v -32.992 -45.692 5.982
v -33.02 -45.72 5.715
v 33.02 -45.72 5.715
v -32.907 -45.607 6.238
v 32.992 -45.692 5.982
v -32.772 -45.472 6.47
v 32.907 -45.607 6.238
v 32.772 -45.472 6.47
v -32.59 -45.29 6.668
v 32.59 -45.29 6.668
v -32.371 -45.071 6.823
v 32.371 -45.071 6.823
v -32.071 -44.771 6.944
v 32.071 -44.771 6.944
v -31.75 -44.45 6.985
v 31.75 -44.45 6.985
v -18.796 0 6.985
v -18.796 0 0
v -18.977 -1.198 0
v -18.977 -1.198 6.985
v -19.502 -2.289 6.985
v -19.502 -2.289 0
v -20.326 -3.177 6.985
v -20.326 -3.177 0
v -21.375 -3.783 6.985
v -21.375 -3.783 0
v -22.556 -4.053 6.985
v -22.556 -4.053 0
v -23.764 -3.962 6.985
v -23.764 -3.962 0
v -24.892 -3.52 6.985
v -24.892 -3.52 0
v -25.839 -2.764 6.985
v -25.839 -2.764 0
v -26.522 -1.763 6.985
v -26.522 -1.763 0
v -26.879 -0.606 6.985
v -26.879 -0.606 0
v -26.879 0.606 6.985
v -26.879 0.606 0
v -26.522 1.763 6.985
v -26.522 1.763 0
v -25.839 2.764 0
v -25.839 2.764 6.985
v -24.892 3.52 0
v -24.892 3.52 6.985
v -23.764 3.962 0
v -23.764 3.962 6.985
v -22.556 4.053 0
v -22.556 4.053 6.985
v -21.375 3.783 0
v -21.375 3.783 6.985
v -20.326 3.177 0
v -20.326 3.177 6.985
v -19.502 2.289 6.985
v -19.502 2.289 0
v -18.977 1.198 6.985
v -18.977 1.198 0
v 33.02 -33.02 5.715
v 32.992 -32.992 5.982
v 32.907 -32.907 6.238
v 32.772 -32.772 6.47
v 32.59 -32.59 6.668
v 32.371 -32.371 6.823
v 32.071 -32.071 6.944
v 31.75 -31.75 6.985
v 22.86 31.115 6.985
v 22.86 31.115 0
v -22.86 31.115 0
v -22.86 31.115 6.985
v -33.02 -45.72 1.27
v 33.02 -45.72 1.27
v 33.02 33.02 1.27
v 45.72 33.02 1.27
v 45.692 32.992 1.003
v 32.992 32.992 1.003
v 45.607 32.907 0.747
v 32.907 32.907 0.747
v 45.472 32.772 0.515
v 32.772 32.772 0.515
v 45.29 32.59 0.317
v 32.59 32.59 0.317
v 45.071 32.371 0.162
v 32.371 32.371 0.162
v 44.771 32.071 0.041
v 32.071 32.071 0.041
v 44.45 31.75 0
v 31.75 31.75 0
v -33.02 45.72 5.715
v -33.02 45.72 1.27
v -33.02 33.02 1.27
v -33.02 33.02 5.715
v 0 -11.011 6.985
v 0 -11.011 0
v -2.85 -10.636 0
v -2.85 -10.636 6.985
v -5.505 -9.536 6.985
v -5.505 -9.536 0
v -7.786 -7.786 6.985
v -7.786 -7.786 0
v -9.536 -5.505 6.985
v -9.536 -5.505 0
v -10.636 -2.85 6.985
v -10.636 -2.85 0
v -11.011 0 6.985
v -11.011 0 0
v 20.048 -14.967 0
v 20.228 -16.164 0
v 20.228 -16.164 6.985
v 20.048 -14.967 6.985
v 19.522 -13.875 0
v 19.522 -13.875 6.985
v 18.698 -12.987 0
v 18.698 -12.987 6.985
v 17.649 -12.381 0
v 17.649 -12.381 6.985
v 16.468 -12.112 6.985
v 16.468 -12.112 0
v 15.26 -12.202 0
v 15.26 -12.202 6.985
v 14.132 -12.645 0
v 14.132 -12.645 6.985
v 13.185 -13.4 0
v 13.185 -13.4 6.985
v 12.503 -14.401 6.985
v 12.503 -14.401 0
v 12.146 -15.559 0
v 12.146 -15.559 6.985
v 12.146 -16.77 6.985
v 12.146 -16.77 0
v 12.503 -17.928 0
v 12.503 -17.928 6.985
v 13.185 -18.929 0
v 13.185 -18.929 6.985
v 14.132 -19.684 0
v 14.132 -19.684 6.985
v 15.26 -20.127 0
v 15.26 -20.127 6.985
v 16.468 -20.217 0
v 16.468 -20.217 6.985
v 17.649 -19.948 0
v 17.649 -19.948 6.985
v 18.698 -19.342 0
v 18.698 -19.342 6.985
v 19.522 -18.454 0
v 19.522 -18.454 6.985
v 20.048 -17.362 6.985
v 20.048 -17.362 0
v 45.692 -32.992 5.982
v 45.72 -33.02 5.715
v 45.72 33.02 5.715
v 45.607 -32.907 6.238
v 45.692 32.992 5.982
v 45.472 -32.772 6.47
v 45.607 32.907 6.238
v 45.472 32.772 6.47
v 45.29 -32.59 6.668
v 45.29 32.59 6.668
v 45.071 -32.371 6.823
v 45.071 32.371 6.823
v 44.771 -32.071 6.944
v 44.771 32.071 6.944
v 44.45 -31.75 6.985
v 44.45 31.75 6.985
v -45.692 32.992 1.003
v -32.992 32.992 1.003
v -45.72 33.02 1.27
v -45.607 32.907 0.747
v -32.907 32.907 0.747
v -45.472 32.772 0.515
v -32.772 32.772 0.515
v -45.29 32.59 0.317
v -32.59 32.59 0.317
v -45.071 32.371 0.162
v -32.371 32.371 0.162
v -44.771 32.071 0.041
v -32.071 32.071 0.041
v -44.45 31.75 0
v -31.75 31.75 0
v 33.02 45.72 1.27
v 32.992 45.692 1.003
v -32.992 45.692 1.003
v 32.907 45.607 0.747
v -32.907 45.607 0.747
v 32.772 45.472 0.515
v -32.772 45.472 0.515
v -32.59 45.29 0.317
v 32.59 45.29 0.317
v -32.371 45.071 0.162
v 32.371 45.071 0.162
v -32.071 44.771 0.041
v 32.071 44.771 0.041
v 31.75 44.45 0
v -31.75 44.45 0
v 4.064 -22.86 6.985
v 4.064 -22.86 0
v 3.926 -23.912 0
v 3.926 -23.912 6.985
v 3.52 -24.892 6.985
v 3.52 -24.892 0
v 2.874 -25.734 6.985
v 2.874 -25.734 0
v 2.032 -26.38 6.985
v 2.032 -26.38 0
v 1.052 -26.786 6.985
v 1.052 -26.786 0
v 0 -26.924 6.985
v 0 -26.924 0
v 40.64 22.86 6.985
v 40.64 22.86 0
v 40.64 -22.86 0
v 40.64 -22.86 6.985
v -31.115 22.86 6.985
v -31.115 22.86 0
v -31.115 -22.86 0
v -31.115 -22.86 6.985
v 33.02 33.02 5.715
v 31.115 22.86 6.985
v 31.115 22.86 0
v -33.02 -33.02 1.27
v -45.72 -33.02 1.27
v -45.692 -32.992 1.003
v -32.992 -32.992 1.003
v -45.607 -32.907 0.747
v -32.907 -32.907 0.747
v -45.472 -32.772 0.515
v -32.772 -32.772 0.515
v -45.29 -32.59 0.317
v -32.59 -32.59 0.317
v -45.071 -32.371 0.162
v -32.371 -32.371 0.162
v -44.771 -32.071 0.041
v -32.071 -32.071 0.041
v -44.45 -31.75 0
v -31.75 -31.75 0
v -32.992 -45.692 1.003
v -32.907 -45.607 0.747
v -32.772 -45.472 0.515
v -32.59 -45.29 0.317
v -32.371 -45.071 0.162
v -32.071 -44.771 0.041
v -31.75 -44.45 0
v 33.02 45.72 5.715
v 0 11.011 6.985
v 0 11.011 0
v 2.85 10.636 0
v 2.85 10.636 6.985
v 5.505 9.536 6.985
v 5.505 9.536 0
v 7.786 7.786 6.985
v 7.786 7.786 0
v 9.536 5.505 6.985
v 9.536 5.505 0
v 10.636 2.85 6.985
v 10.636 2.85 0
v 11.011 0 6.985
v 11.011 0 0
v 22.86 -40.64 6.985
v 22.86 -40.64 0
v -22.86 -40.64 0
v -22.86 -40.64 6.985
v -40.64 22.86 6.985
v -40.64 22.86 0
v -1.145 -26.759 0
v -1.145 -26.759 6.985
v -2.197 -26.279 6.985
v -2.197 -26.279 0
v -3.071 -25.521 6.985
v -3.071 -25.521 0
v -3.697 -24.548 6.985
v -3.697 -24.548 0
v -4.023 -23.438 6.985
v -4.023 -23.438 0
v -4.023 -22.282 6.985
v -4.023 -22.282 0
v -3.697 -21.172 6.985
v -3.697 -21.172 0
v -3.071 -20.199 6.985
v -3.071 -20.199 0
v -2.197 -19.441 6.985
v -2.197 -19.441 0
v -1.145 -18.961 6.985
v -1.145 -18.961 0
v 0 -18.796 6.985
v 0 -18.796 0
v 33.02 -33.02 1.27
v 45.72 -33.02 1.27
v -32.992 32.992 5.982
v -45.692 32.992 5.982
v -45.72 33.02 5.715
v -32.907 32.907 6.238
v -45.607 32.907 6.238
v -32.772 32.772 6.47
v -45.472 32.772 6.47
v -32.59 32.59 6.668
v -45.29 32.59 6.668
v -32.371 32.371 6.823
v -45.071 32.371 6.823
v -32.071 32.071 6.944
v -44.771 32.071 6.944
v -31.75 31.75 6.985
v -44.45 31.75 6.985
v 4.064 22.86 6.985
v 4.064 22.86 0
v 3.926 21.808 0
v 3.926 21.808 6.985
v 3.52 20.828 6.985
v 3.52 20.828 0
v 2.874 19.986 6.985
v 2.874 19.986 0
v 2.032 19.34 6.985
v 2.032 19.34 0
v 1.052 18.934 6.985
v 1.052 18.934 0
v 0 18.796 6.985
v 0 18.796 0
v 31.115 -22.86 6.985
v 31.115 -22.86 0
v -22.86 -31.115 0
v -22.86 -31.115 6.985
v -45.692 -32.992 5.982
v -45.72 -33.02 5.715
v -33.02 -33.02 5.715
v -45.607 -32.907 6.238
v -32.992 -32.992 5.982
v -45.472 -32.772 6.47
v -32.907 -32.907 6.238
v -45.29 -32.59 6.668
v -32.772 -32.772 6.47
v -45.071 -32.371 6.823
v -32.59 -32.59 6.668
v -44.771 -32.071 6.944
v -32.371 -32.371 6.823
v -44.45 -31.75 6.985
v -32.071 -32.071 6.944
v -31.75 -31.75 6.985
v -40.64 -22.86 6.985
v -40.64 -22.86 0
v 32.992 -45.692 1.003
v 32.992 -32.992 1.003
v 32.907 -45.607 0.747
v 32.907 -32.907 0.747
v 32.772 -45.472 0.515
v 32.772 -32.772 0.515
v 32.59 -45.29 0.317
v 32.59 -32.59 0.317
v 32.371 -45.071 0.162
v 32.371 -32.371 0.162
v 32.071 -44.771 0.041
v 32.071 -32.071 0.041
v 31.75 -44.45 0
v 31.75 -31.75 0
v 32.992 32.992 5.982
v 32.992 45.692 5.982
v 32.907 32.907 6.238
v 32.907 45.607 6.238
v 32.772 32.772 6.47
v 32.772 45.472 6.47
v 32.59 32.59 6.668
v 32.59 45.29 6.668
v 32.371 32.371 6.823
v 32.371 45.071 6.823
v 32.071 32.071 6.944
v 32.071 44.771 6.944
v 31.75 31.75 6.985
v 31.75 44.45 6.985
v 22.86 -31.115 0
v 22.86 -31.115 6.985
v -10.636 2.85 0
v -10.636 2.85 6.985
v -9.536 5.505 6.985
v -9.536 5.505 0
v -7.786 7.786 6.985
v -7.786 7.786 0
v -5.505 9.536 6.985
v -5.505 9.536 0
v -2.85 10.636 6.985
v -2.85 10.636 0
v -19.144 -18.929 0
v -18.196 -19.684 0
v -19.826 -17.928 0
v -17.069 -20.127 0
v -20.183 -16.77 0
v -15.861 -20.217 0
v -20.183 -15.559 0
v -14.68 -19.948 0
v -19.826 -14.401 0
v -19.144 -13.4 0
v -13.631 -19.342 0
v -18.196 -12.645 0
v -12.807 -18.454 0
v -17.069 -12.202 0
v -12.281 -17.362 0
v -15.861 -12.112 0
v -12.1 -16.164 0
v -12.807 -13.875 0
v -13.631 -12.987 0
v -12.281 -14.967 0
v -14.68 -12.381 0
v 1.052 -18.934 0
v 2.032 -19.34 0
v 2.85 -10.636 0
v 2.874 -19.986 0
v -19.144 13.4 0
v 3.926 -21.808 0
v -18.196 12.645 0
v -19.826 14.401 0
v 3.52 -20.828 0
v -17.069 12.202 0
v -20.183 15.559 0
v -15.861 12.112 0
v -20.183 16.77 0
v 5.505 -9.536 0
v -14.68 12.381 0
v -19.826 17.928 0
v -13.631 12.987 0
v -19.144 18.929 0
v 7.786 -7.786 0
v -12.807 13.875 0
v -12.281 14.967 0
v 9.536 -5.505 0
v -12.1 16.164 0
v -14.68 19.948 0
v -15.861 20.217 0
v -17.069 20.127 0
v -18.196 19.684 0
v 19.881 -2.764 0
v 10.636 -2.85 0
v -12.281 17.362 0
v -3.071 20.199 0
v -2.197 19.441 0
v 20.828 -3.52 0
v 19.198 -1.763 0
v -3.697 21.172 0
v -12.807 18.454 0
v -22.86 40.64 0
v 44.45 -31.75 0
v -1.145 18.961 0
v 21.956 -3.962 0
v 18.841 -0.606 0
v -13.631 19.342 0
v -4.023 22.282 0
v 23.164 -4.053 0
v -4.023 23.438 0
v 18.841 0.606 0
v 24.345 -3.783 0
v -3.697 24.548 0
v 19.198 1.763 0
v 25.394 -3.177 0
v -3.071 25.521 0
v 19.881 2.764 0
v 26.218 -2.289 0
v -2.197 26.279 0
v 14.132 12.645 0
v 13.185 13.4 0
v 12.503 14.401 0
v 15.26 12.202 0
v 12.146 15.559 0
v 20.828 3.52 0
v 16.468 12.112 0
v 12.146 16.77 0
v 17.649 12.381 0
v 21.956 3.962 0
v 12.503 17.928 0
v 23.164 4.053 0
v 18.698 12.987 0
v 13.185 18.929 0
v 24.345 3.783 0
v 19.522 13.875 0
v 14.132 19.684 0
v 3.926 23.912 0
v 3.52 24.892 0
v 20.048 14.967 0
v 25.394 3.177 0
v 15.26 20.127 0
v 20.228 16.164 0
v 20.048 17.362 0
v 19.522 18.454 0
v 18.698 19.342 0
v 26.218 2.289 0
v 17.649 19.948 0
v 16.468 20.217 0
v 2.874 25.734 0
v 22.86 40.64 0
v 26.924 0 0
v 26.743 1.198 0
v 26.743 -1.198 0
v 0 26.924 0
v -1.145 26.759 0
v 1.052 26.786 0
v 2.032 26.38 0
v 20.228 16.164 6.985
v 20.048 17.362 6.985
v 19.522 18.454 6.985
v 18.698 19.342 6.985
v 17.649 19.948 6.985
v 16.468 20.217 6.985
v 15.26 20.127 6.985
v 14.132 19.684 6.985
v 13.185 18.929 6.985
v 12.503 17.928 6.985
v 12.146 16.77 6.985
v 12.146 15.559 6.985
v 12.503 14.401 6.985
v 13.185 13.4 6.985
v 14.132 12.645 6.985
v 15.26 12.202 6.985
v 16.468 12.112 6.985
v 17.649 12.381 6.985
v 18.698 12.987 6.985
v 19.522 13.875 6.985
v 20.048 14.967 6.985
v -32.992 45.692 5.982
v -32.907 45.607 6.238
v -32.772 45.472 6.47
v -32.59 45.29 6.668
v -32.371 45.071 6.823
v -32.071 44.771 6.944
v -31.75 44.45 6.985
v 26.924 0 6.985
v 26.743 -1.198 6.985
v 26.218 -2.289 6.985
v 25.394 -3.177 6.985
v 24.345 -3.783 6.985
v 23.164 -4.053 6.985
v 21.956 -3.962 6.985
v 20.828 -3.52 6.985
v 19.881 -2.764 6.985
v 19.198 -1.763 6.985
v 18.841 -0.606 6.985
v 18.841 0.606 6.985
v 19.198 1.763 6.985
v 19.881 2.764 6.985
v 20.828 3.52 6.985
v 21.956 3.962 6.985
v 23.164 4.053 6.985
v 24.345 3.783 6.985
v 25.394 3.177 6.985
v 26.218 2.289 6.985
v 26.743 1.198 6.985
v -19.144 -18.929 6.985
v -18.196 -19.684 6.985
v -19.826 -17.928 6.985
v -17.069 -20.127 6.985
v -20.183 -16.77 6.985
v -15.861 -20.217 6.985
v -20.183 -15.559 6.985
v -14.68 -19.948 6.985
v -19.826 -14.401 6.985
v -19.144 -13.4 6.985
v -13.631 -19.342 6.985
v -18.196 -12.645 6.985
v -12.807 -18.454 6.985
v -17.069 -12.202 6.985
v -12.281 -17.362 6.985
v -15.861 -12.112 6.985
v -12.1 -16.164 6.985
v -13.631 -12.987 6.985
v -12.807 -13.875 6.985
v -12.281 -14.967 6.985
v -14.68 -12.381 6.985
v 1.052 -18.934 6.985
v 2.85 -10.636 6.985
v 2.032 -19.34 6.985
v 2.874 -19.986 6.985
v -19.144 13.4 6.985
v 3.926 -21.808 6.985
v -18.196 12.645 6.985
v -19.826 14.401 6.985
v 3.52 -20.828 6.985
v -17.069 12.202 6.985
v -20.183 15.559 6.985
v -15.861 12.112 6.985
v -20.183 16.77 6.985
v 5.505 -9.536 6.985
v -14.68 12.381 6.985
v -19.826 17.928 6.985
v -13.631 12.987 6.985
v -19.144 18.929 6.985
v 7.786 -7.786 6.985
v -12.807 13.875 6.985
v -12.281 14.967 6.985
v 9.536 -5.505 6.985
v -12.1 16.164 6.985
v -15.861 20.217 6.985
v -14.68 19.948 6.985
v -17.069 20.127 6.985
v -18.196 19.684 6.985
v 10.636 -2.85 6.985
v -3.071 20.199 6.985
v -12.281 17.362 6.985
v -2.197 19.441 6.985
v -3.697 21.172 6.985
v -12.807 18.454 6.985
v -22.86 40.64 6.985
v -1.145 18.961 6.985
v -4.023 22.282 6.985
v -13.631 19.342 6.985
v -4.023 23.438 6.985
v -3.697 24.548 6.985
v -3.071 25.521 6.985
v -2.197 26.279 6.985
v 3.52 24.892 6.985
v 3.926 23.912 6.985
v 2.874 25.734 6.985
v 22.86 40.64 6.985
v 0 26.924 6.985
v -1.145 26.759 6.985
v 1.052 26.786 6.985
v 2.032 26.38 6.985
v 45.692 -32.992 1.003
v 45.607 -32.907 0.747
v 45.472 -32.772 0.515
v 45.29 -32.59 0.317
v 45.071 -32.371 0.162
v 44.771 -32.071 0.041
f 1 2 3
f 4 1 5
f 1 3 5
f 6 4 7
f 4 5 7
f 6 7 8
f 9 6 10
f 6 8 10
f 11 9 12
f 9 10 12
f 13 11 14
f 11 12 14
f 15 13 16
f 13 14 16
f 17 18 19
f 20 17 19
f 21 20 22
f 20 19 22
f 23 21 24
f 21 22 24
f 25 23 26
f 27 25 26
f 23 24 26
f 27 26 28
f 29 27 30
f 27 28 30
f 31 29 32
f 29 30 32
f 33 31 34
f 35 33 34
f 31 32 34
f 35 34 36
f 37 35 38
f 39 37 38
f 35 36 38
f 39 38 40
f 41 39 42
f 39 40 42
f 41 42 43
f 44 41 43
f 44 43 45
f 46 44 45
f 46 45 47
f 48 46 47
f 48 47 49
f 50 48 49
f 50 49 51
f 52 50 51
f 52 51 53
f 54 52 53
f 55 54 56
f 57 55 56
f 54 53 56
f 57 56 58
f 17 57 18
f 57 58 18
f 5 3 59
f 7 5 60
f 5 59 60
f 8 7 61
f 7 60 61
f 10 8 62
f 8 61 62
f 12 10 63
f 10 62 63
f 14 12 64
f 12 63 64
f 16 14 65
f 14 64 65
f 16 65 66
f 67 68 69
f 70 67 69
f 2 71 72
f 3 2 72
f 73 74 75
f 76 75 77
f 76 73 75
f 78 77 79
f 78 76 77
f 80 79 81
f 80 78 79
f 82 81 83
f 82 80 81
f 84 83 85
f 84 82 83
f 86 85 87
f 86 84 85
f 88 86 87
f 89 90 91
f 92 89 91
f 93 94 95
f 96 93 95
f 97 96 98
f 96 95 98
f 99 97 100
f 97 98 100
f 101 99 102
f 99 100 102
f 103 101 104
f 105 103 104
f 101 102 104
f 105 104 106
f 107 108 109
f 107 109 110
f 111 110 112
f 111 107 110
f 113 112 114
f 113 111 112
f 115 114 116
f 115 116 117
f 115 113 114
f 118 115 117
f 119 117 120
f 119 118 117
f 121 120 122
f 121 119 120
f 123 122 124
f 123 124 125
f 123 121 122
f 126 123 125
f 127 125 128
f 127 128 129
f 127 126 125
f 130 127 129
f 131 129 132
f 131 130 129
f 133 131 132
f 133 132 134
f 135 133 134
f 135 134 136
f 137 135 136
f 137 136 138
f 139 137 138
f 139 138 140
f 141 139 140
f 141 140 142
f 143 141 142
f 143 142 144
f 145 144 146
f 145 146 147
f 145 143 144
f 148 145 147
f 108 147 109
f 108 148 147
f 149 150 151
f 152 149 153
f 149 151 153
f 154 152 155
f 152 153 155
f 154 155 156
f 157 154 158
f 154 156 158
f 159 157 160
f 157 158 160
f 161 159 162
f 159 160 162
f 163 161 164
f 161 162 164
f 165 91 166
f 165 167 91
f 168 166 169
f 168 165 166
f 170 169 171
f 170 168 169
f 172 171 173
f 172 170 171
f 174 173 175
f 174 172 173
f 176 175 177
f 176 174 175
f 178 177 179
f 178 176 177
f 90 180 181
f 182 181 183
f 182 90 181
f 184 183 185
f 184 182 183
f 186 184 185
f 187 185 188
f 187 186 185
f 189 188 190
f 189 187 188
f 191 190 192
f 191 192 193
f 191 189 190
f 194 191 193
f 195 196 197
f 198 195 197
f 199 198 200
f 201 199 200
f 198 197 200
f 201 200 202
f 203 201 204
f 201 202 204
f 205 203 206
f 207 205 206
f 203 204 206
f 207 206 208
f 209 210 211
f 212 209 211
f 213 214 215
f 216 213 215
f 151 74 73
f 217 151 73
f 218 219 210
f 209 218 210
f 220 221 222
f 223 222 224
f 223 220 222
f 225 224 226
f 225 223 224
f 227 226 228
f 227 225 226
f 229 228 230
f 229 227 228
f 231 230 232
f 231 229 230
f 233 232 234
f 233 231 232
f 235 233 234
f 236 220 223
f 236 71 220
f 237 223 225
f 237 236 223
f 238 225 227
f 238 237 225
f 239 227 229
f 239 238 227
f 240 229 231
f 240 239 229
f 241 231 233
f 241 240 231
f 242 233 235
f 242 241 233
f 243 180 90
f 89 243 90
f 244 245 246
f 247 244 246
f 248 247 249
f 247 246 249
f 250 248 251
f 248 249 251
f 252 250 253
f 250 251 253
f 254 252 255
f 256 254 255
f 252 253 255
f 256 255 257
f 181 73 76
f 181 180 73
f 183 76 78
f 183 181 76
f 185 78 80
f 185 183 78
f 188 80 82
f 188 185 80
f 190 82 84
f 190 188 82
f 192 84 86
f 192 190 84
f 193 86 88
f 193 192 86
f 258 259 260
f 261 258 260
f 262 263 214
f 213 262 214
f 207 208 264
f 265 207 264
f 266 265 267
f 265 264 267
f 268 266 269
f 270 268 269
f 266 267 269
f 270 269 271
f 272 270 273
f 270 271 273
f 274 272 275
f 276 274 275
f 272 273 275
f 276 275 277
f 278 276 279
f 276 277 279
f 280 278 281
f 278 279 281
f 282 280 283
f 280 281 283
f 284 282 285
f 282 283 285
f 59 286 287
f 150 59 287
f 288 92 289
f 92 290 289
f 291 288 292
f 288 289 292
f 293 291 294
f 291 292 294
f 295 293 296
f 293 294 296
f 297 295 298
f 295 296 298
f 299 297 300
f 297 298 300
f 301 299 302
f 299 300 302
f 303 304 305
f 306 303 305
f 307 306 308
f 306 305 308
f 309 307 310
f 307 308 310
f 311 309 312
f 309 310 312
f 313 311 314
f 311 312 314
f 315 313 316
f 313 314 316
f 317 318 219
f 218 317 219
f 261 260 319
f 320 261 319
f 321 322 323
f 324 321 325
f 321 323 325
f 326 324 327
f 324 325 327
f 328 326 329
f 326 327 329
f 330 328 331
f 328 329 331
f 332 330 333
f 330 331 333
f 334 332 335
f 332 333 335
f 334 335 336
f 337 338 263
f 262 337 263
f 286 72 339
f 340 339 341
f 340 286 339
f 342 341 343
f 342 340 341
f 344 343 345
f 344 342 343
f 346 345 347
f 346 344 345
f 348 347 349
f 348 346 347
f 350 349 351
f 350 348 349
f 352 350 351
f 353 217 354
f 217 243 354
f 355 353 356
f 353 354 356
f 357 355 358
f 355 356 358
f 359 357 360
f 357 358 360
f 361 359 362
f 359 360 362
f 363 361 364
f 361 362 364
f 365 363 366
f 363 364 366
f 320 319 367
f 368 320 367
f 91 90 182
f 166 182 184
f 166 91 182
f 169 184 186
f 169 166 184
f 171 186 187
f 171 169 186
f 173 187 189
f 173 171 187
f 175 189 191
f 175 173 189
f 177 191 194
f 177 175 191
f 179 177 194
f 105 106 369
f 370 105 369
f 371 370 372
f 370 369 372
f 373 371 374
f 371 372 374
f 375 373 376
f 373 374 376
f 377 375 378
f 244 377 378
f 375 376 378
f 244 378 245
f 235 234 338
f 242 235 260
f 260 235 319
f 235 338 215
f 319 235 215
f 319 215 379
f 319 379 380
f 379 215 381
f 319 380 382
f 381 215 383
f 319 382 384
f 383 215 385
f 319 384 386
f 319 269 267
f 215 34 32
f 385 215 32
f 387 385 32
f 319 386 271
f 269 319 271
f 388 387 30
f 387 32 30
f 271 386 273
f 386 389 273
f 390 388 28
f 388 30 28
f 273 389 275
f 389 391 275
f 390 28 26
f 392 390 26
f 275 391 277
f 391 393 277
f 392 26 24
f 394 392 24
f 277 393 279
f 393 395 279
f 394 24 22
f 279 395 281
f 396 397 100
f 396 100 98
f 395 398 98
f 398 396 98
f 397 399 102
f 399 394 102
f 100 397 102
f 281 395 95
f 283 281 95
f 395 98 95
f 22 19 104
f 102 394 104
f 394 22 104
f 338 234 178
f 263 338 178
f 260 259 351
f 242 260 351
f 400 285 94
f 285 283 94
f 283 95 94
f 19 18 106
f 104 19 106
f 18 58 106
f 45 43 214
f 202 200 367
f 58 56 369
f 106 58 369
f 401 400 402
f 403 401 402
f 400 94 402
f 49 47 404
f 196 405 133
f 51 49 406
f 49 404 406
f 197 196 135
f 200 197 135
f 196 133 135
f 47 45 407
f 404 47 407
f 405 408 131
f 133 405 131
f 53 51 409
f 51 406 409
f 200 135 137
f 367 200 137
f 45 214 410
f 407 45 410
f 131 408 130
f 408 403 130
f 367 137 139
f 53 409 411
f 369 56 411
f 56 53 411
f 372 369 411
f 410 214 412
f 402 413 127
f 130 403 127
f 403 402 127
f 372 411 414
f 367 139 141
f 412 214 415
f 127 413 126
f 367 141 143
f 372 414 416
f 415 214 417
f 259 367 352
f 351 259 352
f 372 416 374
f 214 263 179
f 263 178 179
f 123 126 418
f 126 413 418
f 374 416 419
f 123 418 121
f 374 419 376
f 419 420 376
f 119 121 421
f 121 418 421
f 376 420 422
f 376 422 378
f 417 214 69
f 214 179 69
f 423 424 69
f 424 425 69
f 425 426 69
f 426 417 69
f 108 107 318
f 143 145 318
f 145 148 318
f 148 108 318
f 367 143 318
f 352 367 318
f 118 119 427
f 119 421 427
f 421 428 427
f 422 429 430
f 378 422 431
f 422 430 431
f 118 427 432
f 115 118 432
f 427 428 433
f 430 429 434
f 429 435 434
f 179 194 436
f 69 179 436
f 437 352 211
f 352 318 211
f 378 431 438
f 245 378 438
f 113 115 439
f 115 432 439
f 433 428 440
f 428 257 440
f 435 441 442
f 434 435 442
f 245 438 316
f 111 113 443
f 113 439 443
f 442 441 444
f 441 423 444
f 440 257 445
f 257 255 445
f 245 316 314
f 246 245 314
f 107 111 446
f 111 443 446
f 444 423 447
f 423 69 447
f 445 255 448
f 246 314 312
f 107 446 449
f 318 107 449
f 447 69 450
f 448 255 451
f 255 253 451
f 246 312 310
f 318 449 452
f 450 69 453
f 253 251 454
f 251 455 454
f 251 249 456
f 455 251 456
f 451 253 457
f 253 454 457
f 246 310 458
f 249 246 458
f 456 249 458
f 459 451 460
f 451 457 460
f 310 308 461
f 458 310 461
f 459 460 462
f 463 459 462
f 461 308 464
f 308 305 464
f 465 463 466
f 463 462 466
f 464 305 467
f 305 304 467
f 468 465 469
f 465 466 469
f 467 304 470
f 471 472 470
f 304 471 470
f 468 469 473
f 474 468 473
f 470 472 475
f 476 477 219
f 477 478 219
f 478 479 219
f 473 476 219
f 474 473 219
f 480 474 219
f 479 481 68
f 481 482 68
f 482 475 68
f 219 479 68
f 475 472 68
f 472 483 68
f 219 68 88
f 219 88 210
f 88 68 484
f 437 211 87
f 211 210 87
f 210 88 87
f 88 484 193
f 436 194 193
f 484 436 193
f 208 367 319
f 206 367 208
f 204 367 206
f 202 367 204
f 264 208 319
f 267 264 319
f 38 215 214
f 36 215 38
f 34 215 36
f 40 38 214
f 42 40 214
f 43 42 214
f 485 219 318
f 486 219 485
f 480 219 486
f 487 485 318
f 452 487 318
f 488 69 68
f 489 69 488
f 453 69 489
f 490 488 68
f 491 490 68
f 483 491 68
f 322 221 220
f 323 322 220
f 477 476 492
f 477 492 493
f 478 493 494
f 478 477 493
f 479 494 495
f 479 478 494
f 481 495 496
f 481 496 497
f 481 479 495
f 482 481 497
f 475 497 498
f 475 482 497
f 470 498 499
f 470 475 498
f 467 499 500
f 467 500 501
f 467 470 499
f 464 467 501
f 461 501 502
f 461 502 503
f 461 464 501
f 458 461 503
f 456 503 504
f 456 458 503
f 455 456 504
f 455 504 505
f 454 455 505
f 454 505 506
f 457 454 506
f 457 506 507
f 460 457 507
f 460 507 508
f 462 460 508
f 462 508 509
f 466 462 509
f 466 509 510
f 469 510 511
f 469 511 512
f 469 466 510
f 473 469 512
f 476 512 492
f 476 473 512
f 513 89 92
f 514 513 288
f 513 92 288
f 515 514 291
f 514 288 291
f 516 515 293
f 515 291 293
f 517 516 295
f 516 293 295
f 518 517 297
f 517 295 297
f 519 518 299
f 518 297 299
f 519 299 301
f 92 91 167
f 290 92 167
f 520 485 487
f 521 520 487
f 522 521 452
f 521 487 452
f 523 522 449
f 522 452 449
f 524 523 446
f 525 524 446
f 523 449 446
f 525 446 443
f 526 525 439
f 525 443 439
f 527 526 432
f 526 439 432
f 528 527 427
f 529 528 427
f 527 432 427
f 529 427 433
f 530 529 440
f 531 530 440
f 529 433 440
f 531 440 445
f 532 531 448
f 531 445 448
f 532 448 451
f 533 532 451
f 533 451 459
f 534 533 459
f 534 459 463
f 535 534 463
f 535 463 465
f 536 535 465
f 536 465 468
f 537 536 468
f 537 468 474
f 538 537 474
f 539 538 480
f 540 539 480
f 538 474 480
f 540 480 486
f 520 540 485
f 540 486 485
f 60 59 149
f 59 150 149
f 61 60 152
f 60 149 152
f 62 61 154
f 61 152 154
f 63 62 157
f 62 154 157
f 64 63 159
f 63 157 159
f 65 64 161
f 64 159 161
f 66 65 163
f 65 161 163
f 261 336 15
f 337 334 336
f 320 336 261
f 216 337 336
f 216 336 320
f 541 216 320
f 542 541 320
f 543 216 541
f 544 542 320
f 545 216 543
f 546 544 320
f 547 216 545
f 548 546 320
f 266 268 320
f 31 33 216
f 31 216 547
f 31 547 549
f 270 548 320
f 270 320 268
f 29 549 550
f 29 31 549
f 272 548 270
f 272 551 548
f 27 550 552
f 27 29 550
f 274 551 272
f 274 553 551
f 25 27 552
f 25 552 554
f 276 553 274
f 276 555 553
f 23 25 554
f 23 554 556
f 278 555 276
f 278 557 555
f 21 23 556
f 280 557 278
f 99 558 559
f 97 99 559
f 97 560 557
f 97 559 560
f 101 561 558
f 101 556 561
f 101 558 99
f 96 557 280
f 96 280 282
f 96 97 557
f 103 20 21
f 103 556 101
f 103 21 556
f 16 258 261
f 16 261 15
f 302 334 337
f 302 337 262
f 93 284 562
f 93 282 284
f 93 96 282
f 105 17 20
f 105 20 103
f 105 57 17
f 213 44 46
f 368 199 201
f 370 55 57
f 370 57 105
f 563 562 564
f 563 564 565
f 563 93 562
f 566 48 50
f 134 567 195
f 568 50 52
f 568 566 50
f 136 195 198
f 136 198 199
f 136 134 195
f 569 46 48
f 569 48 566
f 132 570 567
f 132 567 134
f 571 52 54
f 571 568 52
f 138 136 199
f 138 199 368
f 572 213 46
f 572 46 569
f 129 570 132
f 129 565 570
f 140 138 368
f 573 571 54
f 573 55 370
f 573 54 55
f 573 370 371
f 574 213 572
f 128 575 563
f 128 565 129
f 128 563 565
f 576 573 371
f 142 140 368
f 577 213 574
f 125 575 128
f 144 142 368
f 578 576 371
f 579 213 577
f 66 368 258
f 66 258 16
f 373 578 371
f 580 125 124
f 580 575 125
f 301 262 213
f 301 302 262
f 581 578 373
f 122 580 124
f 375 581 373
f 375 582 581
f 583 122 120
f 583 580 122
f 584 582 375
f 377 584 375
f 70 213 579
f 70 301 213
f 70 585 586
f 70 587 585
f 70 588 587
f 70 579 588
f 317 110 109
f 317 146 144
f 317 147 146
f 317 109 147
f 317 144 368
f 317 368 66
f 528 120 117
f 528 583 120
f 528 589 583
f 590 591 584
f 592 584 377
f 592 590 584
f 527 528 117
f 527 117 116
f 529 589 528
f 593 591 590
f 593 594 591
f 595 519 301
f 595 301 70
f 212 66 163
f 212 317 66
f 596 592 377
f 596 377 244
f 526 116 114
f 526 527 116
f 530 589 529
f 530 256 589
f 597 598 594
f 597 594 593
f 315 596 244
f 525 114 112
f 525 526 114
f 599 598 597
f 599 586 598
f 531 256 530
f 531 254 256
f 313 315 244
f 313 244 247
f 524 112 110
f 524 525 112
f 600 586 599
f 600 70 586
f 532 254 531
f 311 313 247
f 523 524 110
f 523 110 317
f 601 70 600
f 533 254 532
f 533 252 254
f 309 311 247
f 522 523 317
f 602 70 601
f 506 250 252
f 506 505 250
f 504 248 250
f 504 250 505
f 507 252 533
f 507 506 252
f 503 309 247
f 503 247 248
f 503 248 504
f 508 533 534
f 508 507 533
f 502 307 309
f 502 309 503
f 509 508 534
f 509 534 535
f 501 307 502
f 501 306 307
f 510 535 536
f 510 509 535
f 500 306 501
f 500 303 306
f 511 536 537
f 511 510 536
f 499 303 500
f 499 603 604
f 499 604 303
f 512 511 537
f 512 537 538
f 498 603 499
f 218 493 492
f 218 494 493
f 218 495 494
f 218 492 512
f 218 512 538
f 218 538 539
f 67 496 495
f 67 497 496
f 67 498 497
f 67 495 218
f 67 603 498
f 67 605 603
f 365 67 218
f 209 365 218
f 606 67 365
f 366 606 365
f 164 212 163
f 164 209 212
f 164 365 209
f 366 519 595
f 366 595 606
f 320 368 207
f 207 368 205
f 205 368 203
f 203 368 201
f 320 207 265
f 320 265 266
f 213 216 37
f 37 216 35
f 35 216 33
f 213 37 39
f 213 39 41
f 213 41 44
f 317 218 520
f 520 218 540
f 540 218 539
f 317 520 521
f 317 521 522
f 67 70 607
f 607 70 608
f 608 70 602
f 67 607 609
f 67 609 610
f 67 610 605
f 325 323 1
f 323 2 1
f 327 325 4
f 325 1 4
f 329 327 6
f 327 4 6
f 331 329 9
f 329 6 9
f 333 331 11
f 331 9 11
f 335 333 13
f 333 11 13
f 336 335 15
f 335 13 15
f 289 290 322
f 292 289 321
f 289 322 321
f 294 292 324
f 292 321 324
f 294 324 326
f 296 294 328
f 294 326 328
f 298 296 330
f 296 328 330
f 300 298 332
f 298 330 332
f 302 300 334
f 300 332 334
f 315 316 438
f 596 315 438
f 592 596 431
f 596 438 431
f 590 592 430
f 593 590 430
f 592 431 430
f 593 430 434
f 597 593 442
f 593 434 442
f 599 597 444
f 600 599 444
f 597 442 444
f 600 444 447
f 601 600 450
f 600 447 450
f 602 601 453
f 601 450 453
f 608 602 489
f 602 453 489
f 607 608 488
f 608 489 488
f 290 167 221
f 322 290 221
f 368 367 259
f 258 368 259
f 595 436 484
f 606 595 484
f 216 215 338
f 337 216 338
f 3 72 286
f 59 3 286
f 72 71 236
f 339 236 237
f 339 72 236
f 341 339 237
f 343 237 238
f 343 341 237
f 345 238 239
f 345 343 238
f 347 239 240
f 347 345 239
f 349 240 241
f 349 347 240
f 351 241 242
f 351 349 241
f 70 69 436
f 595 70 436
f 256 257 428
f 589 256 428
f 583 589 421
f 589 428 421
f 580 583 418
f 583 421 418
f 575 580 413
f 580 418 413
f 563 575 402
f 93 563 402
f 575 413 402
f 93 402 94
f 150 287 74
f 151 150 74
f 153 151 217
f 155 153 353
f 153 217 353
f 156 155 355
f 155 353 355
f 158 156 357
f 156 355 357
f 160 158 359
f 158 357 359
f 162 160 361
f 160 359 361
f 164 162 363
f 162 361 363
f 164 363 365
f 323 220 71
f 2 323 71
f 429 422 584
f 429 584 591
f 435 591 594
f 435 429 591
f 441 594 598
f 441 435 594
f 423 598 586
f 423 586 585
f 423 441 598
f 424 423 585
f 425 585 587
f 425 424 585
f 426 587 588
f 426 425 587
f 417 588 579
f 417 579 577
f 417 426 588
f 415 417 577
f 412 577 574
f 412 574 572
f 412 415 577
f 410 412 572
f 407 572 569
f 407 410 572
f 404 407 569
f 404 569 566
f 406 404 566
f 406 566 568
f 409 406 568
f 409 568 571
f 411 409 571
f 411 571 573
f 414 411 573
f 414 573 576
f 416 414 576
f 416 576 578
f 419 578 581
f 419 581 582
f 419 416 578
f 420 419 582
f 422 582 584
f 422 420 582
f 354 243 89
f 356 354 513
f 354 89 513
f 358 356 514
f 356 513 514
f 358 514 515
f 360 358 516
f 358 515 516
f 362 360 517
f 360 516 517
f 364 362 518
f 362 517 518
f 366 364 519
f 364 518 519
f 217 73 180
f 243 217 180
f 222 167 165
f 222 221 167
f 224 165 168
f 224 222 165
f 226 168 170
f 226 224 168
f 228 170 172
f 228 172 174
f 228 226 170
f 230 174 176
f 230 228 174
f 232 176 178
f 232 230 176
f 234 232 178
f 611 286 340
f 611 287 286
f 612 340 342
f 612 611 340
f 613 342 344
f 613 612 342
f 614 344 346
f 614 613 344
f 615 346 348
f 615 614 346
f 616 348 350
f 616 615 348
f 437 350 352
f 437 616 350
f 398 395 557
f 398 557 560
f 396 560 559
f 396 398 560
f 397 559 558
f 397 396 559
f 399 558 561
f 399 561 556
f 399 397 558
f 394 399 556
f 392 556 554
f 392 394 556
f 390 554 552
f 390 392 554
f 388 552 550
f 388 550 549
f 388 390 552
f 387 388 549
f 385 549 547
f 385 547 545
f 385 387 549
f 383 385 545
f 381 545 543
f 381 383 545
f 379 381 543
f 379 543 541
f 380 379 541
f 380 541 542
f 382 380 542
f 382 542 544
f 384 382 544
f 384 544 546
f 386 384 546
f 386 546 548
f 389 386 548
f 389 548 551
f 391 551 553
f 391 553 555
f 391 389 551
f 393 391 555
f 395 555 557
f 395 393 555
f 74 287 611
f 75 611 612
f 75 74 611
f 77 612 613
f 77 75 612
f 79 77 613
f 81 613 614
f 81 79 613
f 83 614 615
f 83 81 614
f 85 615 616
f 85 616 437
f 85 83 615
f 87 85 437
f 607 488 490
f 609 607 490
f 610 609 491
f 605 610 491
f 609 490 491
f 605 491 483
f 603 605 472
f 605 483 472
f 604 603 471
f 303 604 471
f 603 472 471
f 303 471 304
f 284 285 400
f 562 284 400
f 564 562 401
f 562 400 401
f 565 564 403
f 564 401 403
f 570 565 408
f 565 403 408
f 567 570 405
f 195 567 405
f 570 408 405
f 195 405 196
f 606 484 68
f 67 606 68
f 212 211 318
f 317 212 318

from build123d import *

# Parameters (mm, degrees)
F0_R     = 4.064
F1_DEPTH = 6.985
F2_R     = 1.27


with BuildPart() as f1:
    # F0 (on Top) → F1 (new body)
    with BuildSketch(Plane.XY):
        with BuildLine():
            ThreePointArc((-11.0109, 0), (-7.785882, 7.785882), (0, 11.0109))
            Line((0, 11.0109), (0, 18.796))
            ThreePointArc((0, 18.796), (-4.064, 22.86), (0, 26.924))
            Line((0, 26.924), (0, 31.115))
            Line((0, 31.115), (-22.86, 31.115))
            Line((-22.86, 31.115), (-22.86, 40.64))
            Line((-22.86, 40.64), (0, 40.64))
            Line((0, 40.64), (0, 45.72))
            Line((0, 45.72), (-33.02, 45.72))
            Line((-33.02, 45.72), (-33.02, 33.02))
            Line((-33.02, 33.02), (-45.72, 33.02))
            Line((-45.72, 33.02), (-45.72, 0))
            Line((-45.72, 0), (-40.64, 0))
            Line((-40.64, 0), (-40.64, 22.86))
            Line((-40.64, 22.86), (-31.115, 22.86))
            Line((-31.115, 22.86), (-31.115, 0))
            Line((-31.115, 0), (-26.924, 0))
            ThreePointArc((-26.924, 0), (-22.86, 4.064), (-18.796, 0))
            Line((-18.796, 0), (-11.0109, 0))
        make_face()
        with Locations((-16.164461, 16.164461)):
            Circle(F0_R, mode=Mode.SUBTRACT)
        with BuildLine():
            ThreePointArc((0, 11.0109), (7.785882, 7.785882), (11.0109, 0))
            Line((11.0109, 0), (18.796, 0))
            ThreePointArc((18.796, 0), (22.86, 4.064), (26.924, 0))
            Line((26.924, 0), (31.115, 0))
            Line((31.115, 0), (31.115, 22.86))
            Line((31.115, 22.86), (40.64, 22.86))
            Line((40.64, 22.86), (40.64, 0))
            Line((40.64, 0), (45.72, 0))
            Line((45.72, 0), (45.72, 33.02))
            Line((45.72, 33.02), (33.02, 33.02))
            Line((33.02, 33.02), (33.02, 45.72))
            Line((33.02, 45.72), (0, 45.72))
            Line((0, 45.72), (0, 40.64))
            Line((0, 40.64), (22.86, 40.64))
            Line((22.86, 40.64), (22.86, 31.115))
            Line((22.86, 31.115), (0, 31.115))
            Line((0, 31.115), (0, 26.924))
            ThreePointArc((0, 26.924), (2.873682, 25.733682), (4.064, 22.86))
            ThreePointArc((4.064, 22.86), (2.873682, 19.986318), (0, 18.796))
            Line((0, 18.796), (0, 11.0109))
        make_face()
        with Locations((16.164461, 16.164461)):
            Circle(F0_R, mode=Mode.SUBTRACT)
        with BuildLine():
            Line((18.796, 0), (11.0109, 0))
            ThreePointArc((11.0109, 0), (7.785882, -7.785882), (0, -11.0109))
            Line((0, -11.0109), (0, -18.796))
            ThreePointArc((0, -18.796), (2.873682, -19.986318), (4.064, -22.86))
            ThreePointArc((4.064, -22.86), (2.873682, -25.733682), (0, -26.924))
            Line((0, -26.924), (0, -31.115))
            Line((0, -31.115), (22.86, -31.115))
            Line((22.86, -31.115), (22.86, -40.64))
            Line((22.86, -40.64), (0, -40.64))
            Line((0, -40.64), (0, -45.72))
            Line((0, -45.72), (33.02, -45.72))
            Line((33.02, -45.72), (33.02, -33.02))
            Line((33.02, -33.02), (45.72, -33.02))
            Line((45.72, -33.02), (45.72, 0))
            Line((45.72, 0), (40.64, 0))
            Line((40.64, 0), (40.64, -22.86))
            Line((40.64, -22.86), (31.115, -22.86))
            Line((31.115, -22.86), (31.115, 0))
            Line((31.115, 0), (26.924, 0))
            ThreePointArc((26.924, 0), (22.86, -4.064), (18.796, 0))
        make_face()
        with Locations((16.164461, -16.164461)):
            Circle(F0_R, mode=Mode.SUBTRACT)
        with BuildLine():
            Line((0, -18.796), (0, -11.0109))
            ThreePointArc((0, -11.0109), (-7.785882, -7.785882), (-11.0109, 0))
            Line((-11.0109, 0), (-18.796, 0))
            ThreePointArc((-18.796, 0), (-22.86, -4.064), (-26.924, 0))
            Line((-26.924, 0), (-31.115, 0))
            Line((-31.115, 0), (-31.115, -22.86))
            Line((-31.115, -22.86), (-40.64, -22.86))
            Line((-40.64, -22.86), (-40.64, 0))
            Line((-40.64, 0), (-45.72, 0))
            Line((-45.72, 0), (-45.72, -33.02))
            Line((-45.72, -33.02), (-33.02, -33.02))
            Line((-33.02, -33.02), (-33.02, -45.72))
            Line((-33.02, -45.72), (0, -45.72))
            Line((0, -45.72), (0, -40.64))
            Line((0, -40.64), (-22.86, -40.64))
            Line((-22.86, -40.64), (-22.86, -31.115))
            Line((-22.86, -31.115), (0, -31.115))
            Line((0, -31.115), (0, -26.924))
            ThreePointArc((0, -26.924), (-4.064, -22.86), (0, -18.796))
        make_face()
        with Locations((-16.164461, -16.164461)):
            Circle(F0_R, mode=Mode.SUBTRACT)
    extrude(amount=F1_DEPTH)

    # F2
    f2_edges = [f1.edges().sort_by_distance(p)[0] for p in [
        (0, 45.72, 6.985),
        (-33.02, 39.37, 6.985),
        (-39.37, 33.02, 6.985),
        (-45.72, 0, 6.985),
        (-33.02, -39.37, 6.985),
        (-39.37, -33.02, 6.985),
        (0, -45.72, 6.985),
        (33.02, -39.37, 6.985),
        (39.37, -33.02, 6.985),
        (45.72, 0, 6.985),
        (39.37, 33.02, 6.985),
        (33.02, 39.37, 6.985),
        (0, -45.72, 0),
        (-33.02, -39.37, 0),
        (-39.37, -33.02, 0),
        (-45.72, 0, 0),
        (-39.37, 33.02, 0),
        (-33.02, 39.37, 0),
        (0, 45.72, 0),
        (33.02, 39.37, 0),
        (39.37, 33.02, 0),
        (45.72, 0, 0),
        (39.37, -33.02, 0),
        (33.02, -39.37, 0),
    ]]
    fillet(f2_edges, radius=F2_R)


solid = f1.part
